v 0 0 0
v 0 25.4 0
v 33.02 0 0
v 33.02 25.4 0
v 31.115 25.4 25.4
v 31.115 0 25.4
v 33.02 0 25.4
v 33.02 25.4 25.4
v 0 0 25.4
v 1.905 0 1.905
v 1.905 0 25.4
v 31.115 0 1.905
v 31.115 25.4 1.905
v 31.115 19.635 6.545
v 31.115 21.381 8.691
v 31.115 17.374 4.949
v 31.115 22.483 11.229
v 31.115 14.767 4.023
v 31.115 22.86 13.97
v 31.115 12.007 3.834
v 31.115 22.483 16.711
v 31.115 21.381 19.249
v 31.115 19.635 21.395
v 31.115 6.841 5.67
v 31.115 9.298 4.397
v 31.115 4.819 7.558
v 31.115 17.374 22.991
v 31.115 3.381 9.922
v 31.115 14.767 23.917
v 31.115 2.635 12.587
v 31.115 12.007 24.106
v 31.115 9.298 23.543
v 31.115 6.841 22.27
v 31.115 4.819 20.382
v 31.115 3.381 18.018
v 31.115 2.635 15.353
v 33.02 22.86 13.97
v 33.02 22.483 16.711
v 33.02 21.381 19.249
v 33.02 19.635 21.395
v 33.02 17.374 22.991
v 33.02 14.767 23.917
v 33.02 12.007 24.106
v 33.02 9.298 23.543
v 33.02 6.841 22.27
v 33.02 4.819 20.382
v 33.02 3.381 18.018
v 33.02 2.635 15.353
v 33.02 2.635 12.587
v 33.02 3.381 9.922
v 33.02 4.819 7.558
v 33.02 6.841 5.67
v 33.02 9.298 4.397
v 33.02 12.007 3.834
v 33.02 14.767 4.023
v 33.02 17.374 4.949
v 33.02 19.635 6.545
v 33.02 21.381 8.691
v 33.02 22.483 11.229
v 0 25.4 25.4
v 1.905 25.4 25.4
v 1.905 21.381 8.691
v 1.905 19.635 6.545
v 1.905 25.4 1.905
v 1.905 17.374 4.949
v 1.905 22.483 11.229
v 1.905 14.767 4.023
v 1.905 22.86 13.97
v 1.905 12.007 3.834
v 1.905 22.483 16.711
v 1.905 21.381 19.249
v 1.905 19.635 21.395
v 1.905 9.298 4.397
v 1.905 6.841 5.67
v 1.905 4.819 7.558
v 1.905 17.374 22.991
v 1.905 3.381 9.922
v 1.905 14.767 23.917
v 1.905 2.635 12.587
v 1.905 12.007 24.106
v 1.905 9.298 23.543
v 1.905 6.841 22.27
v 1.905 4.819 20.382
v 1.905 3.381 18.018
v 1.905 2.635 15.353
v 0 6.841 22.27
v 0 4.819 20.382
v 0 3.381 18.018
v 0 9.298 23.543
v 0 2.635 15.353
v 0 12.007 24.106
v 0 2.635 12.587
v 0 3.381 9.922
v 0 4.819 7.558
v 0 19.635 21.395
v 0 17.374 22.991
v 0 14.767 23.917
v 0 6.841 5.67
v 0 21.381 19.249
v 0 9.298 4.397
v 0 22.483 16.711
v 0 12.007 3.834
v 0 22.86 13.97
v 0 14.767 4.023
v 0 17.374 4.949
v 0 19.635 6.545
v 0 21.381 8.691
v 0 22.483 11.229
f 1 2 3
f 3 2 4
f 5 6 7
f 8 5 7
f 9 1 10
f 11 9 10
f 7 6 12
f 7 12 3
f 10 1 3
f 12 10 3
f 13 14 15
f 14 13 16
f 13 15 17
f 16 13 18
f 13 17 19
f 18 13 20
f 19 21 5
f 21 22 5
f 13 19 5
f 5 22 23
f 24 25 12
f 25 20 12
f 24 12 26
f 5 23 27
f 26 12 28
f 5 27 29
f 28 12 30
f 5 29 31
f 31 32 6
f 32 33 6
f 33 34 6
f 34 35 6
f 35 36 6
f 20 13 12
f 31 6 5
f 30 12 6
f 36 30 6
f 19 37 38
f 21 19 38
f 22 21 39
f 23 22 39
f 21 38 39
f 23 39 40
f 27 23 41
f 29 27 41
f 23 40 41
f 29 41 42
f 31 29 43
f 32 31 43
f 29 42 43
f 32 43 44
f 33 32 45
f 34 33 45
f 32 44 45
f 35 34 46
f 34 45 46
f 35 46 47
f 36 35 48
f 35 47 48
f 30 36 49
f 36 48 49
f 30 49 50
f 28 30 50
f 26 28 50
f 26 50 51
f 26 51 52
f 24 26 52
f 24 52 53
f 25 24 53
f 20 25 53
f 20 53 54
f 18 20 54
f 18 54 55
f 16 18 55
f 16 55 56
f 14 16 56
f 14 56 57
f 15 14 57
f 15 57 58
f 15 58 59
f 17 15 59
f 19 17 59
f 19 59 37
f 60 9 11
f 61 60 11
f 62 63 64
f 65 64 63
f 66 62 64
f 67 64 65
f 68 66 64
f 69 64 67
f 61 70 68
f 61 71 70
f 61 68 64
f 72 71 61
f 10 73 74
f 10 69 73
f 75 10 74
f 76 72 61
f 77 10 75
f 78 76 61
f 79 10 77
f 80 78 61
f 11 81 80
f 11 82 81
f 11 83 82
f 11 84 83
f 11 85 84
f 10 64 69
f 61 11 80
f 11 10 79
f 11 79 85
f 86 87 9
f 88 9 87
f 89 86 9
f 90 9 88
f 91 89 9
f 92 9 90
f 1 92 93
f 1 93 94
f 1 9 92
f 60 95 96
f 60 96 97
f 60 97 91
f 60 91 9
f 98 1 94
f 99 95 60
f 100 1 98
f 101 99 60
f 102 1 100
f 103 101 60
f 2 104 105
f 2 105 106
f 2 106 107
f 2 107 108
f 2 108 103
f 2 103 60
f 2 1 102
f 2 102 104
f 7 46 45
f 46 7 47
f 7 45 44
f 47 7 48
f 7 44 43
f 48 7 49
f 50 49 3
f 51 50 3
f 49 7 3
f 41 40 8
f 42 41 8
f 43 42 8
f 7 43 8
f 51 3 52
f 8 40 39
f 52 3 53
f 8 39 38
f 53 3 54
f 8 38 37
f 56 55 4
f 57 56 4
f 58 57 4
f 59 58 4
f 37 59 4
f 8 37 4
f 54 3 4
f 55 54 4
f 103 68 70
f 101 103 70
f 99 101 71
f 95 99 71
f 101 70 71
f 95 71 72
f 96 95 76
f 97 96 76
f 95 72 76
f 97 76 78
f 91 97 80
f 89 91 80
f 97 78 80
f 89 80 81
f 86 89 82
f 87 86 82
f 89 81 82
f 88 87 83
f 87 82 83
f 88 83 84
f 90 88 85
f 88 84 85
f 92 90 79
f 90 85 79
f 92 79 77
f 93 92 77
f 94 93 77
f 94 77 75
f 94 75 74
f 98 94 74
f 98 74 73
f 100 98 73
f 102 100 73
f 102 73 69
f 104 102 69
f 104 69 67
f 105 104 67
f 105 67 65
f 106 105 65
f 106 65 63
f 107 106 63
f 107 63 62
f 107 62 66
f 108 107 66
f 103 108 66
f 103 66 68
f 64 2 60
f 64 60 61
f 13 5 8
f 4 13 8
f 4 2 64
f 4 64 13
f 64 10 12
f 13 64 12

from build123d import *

# Parameters (mm, degrees)
F0_W     = 33.02
F0_H     = 25.4
F1_DEPTH = 25.4
F2_R     = 10.16
F3_DEPTH = 50.8
F4_W     = 29.21
F4_H     = 23.495
F5_DEPTH = 25.4


with BuildPart() as f1:
    # F0 (on Top) → F1 (new body)
    with BuildSketch(Plane.XY):
        with Locations((16.51, 12.7)):
            Rectangle(F0_W, F0_H)
    extrude(amount=F1_DEPTH)

    # F2 (on face) → F3 (cut)
    with BuildSketch(Plane.YZ.offset(33.02)):
        with Locations((12.7, 13.97)):
            Circle(F2_R)
    extrude(amount=-F3_DEPTH, mode=Mode.SUBTRACT)

    # F4 (on face) → F5 (cut)
    with BuildSketch(Plane.XZ):
        with Locations((16.51, 13.6525)):
            Rectangle(F4_W, F4_H)
    extrude(amount=-F5_DEPTH, mode=Mode.SUBTRACT)


solid = f1.part
